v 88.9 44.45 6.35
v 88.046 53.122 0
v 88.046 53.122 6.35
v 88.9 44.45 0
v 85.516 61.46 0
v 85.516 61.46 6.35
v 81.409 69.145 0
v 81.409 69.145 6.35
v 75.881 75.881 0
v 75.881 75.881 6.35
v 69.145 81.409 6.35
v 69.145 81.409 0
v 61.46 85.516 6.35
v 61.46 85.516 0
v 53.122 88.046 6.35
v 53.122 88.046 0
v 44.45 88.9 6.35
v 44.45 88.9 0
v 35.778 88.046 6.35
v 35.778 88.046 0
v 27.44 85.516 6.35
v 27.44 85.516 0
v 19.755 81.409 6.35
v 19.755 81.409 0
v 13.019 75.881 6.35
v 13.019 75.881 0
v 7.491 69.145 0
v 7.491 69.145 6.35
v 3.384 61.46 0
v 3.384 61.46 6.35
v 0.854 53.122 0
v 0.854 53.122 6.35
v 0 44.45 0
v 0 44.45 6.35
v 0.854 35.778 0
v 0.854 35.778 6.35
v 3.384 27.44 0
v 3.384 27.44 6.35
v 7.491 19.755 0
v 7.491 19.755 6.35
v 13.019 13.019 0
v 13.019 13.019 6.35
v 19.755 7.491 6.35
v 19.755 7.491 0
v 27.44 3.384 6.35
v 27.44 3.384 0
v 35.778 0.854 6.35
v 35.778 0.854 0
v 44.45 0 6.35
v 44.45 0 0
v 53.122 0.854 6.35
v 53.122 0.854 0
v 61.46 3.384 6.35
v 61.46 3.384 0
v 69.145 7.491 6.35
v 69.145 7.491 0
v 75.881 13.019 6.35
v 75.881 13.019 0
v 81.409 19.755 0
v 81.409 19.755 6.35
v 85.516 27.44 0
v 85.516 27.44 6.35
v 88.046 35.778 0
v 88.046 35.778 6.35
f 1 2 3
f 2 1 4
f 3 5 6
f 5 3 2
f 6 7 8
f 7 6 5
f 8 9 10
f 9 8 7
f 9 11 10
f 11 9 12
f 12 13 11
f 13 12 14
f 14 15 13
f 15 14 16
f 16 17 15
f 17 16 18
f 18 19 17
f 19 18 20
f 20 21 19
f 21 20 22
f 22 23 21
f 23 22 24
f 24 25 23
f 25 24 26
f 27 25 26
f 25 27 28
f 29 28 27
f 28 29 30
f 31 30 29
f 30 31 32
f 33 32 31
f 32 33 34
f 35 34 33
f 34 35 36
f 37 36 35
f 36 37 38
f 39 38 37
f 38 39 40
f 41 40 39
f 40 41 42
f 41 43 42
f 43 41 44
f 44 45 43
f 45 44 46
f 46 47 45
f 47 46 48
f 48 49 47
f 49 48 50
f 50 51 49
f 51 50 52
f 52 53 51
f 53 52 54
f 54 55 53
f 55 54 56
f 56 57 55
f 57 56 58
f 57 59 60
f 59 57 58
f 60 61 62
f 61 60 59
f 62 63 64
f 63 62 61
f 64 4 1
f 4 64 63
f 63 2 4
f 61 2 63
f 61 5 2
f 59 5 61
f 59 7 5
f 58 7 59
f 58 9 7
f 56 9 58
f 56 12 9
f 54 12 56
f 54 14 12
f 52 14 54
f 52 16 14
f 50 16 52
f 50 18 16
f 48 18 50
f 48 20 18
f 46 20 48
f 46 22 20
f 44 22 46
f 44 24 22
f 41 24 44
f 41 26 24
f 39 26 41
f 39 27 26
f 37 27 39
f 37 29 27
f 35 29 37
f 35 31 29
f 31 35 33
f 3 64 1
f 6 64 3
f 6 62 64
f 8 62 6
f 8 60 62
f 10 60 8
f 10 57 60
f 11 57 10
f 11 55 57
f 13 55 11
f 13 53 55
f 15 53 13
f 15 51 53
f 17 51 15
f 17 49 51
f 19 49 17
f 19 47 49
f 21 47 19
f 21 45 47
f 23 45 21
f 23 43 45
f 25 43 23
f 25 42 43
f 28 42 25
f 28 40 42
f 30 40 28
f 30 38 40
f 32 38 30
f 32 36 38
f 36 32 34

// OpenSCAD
$tube_r = i2mm(1.75);
$resolution = 32;


/* i2mm inch to millimeter 
 *   INPUT
       -- "inch" value expressed as inches
 *   RETURN: 
       -- value expressed as millimeters
 */
function i2mm(inch) = (25.4 * inch);

module doit() {
    cylinder(r=$tube_r, h=i2mm(0.25),$fn=$resolution);   
}



$2d = 0;

if ($2d) {
    projection(cut=true) {
        translate([$tube_r,$tube_r, 0]) {
            doit();
        } 
    }
} else {
    translate([$tube_r,$tube_r, 0]) {
        doit();
    }
}
